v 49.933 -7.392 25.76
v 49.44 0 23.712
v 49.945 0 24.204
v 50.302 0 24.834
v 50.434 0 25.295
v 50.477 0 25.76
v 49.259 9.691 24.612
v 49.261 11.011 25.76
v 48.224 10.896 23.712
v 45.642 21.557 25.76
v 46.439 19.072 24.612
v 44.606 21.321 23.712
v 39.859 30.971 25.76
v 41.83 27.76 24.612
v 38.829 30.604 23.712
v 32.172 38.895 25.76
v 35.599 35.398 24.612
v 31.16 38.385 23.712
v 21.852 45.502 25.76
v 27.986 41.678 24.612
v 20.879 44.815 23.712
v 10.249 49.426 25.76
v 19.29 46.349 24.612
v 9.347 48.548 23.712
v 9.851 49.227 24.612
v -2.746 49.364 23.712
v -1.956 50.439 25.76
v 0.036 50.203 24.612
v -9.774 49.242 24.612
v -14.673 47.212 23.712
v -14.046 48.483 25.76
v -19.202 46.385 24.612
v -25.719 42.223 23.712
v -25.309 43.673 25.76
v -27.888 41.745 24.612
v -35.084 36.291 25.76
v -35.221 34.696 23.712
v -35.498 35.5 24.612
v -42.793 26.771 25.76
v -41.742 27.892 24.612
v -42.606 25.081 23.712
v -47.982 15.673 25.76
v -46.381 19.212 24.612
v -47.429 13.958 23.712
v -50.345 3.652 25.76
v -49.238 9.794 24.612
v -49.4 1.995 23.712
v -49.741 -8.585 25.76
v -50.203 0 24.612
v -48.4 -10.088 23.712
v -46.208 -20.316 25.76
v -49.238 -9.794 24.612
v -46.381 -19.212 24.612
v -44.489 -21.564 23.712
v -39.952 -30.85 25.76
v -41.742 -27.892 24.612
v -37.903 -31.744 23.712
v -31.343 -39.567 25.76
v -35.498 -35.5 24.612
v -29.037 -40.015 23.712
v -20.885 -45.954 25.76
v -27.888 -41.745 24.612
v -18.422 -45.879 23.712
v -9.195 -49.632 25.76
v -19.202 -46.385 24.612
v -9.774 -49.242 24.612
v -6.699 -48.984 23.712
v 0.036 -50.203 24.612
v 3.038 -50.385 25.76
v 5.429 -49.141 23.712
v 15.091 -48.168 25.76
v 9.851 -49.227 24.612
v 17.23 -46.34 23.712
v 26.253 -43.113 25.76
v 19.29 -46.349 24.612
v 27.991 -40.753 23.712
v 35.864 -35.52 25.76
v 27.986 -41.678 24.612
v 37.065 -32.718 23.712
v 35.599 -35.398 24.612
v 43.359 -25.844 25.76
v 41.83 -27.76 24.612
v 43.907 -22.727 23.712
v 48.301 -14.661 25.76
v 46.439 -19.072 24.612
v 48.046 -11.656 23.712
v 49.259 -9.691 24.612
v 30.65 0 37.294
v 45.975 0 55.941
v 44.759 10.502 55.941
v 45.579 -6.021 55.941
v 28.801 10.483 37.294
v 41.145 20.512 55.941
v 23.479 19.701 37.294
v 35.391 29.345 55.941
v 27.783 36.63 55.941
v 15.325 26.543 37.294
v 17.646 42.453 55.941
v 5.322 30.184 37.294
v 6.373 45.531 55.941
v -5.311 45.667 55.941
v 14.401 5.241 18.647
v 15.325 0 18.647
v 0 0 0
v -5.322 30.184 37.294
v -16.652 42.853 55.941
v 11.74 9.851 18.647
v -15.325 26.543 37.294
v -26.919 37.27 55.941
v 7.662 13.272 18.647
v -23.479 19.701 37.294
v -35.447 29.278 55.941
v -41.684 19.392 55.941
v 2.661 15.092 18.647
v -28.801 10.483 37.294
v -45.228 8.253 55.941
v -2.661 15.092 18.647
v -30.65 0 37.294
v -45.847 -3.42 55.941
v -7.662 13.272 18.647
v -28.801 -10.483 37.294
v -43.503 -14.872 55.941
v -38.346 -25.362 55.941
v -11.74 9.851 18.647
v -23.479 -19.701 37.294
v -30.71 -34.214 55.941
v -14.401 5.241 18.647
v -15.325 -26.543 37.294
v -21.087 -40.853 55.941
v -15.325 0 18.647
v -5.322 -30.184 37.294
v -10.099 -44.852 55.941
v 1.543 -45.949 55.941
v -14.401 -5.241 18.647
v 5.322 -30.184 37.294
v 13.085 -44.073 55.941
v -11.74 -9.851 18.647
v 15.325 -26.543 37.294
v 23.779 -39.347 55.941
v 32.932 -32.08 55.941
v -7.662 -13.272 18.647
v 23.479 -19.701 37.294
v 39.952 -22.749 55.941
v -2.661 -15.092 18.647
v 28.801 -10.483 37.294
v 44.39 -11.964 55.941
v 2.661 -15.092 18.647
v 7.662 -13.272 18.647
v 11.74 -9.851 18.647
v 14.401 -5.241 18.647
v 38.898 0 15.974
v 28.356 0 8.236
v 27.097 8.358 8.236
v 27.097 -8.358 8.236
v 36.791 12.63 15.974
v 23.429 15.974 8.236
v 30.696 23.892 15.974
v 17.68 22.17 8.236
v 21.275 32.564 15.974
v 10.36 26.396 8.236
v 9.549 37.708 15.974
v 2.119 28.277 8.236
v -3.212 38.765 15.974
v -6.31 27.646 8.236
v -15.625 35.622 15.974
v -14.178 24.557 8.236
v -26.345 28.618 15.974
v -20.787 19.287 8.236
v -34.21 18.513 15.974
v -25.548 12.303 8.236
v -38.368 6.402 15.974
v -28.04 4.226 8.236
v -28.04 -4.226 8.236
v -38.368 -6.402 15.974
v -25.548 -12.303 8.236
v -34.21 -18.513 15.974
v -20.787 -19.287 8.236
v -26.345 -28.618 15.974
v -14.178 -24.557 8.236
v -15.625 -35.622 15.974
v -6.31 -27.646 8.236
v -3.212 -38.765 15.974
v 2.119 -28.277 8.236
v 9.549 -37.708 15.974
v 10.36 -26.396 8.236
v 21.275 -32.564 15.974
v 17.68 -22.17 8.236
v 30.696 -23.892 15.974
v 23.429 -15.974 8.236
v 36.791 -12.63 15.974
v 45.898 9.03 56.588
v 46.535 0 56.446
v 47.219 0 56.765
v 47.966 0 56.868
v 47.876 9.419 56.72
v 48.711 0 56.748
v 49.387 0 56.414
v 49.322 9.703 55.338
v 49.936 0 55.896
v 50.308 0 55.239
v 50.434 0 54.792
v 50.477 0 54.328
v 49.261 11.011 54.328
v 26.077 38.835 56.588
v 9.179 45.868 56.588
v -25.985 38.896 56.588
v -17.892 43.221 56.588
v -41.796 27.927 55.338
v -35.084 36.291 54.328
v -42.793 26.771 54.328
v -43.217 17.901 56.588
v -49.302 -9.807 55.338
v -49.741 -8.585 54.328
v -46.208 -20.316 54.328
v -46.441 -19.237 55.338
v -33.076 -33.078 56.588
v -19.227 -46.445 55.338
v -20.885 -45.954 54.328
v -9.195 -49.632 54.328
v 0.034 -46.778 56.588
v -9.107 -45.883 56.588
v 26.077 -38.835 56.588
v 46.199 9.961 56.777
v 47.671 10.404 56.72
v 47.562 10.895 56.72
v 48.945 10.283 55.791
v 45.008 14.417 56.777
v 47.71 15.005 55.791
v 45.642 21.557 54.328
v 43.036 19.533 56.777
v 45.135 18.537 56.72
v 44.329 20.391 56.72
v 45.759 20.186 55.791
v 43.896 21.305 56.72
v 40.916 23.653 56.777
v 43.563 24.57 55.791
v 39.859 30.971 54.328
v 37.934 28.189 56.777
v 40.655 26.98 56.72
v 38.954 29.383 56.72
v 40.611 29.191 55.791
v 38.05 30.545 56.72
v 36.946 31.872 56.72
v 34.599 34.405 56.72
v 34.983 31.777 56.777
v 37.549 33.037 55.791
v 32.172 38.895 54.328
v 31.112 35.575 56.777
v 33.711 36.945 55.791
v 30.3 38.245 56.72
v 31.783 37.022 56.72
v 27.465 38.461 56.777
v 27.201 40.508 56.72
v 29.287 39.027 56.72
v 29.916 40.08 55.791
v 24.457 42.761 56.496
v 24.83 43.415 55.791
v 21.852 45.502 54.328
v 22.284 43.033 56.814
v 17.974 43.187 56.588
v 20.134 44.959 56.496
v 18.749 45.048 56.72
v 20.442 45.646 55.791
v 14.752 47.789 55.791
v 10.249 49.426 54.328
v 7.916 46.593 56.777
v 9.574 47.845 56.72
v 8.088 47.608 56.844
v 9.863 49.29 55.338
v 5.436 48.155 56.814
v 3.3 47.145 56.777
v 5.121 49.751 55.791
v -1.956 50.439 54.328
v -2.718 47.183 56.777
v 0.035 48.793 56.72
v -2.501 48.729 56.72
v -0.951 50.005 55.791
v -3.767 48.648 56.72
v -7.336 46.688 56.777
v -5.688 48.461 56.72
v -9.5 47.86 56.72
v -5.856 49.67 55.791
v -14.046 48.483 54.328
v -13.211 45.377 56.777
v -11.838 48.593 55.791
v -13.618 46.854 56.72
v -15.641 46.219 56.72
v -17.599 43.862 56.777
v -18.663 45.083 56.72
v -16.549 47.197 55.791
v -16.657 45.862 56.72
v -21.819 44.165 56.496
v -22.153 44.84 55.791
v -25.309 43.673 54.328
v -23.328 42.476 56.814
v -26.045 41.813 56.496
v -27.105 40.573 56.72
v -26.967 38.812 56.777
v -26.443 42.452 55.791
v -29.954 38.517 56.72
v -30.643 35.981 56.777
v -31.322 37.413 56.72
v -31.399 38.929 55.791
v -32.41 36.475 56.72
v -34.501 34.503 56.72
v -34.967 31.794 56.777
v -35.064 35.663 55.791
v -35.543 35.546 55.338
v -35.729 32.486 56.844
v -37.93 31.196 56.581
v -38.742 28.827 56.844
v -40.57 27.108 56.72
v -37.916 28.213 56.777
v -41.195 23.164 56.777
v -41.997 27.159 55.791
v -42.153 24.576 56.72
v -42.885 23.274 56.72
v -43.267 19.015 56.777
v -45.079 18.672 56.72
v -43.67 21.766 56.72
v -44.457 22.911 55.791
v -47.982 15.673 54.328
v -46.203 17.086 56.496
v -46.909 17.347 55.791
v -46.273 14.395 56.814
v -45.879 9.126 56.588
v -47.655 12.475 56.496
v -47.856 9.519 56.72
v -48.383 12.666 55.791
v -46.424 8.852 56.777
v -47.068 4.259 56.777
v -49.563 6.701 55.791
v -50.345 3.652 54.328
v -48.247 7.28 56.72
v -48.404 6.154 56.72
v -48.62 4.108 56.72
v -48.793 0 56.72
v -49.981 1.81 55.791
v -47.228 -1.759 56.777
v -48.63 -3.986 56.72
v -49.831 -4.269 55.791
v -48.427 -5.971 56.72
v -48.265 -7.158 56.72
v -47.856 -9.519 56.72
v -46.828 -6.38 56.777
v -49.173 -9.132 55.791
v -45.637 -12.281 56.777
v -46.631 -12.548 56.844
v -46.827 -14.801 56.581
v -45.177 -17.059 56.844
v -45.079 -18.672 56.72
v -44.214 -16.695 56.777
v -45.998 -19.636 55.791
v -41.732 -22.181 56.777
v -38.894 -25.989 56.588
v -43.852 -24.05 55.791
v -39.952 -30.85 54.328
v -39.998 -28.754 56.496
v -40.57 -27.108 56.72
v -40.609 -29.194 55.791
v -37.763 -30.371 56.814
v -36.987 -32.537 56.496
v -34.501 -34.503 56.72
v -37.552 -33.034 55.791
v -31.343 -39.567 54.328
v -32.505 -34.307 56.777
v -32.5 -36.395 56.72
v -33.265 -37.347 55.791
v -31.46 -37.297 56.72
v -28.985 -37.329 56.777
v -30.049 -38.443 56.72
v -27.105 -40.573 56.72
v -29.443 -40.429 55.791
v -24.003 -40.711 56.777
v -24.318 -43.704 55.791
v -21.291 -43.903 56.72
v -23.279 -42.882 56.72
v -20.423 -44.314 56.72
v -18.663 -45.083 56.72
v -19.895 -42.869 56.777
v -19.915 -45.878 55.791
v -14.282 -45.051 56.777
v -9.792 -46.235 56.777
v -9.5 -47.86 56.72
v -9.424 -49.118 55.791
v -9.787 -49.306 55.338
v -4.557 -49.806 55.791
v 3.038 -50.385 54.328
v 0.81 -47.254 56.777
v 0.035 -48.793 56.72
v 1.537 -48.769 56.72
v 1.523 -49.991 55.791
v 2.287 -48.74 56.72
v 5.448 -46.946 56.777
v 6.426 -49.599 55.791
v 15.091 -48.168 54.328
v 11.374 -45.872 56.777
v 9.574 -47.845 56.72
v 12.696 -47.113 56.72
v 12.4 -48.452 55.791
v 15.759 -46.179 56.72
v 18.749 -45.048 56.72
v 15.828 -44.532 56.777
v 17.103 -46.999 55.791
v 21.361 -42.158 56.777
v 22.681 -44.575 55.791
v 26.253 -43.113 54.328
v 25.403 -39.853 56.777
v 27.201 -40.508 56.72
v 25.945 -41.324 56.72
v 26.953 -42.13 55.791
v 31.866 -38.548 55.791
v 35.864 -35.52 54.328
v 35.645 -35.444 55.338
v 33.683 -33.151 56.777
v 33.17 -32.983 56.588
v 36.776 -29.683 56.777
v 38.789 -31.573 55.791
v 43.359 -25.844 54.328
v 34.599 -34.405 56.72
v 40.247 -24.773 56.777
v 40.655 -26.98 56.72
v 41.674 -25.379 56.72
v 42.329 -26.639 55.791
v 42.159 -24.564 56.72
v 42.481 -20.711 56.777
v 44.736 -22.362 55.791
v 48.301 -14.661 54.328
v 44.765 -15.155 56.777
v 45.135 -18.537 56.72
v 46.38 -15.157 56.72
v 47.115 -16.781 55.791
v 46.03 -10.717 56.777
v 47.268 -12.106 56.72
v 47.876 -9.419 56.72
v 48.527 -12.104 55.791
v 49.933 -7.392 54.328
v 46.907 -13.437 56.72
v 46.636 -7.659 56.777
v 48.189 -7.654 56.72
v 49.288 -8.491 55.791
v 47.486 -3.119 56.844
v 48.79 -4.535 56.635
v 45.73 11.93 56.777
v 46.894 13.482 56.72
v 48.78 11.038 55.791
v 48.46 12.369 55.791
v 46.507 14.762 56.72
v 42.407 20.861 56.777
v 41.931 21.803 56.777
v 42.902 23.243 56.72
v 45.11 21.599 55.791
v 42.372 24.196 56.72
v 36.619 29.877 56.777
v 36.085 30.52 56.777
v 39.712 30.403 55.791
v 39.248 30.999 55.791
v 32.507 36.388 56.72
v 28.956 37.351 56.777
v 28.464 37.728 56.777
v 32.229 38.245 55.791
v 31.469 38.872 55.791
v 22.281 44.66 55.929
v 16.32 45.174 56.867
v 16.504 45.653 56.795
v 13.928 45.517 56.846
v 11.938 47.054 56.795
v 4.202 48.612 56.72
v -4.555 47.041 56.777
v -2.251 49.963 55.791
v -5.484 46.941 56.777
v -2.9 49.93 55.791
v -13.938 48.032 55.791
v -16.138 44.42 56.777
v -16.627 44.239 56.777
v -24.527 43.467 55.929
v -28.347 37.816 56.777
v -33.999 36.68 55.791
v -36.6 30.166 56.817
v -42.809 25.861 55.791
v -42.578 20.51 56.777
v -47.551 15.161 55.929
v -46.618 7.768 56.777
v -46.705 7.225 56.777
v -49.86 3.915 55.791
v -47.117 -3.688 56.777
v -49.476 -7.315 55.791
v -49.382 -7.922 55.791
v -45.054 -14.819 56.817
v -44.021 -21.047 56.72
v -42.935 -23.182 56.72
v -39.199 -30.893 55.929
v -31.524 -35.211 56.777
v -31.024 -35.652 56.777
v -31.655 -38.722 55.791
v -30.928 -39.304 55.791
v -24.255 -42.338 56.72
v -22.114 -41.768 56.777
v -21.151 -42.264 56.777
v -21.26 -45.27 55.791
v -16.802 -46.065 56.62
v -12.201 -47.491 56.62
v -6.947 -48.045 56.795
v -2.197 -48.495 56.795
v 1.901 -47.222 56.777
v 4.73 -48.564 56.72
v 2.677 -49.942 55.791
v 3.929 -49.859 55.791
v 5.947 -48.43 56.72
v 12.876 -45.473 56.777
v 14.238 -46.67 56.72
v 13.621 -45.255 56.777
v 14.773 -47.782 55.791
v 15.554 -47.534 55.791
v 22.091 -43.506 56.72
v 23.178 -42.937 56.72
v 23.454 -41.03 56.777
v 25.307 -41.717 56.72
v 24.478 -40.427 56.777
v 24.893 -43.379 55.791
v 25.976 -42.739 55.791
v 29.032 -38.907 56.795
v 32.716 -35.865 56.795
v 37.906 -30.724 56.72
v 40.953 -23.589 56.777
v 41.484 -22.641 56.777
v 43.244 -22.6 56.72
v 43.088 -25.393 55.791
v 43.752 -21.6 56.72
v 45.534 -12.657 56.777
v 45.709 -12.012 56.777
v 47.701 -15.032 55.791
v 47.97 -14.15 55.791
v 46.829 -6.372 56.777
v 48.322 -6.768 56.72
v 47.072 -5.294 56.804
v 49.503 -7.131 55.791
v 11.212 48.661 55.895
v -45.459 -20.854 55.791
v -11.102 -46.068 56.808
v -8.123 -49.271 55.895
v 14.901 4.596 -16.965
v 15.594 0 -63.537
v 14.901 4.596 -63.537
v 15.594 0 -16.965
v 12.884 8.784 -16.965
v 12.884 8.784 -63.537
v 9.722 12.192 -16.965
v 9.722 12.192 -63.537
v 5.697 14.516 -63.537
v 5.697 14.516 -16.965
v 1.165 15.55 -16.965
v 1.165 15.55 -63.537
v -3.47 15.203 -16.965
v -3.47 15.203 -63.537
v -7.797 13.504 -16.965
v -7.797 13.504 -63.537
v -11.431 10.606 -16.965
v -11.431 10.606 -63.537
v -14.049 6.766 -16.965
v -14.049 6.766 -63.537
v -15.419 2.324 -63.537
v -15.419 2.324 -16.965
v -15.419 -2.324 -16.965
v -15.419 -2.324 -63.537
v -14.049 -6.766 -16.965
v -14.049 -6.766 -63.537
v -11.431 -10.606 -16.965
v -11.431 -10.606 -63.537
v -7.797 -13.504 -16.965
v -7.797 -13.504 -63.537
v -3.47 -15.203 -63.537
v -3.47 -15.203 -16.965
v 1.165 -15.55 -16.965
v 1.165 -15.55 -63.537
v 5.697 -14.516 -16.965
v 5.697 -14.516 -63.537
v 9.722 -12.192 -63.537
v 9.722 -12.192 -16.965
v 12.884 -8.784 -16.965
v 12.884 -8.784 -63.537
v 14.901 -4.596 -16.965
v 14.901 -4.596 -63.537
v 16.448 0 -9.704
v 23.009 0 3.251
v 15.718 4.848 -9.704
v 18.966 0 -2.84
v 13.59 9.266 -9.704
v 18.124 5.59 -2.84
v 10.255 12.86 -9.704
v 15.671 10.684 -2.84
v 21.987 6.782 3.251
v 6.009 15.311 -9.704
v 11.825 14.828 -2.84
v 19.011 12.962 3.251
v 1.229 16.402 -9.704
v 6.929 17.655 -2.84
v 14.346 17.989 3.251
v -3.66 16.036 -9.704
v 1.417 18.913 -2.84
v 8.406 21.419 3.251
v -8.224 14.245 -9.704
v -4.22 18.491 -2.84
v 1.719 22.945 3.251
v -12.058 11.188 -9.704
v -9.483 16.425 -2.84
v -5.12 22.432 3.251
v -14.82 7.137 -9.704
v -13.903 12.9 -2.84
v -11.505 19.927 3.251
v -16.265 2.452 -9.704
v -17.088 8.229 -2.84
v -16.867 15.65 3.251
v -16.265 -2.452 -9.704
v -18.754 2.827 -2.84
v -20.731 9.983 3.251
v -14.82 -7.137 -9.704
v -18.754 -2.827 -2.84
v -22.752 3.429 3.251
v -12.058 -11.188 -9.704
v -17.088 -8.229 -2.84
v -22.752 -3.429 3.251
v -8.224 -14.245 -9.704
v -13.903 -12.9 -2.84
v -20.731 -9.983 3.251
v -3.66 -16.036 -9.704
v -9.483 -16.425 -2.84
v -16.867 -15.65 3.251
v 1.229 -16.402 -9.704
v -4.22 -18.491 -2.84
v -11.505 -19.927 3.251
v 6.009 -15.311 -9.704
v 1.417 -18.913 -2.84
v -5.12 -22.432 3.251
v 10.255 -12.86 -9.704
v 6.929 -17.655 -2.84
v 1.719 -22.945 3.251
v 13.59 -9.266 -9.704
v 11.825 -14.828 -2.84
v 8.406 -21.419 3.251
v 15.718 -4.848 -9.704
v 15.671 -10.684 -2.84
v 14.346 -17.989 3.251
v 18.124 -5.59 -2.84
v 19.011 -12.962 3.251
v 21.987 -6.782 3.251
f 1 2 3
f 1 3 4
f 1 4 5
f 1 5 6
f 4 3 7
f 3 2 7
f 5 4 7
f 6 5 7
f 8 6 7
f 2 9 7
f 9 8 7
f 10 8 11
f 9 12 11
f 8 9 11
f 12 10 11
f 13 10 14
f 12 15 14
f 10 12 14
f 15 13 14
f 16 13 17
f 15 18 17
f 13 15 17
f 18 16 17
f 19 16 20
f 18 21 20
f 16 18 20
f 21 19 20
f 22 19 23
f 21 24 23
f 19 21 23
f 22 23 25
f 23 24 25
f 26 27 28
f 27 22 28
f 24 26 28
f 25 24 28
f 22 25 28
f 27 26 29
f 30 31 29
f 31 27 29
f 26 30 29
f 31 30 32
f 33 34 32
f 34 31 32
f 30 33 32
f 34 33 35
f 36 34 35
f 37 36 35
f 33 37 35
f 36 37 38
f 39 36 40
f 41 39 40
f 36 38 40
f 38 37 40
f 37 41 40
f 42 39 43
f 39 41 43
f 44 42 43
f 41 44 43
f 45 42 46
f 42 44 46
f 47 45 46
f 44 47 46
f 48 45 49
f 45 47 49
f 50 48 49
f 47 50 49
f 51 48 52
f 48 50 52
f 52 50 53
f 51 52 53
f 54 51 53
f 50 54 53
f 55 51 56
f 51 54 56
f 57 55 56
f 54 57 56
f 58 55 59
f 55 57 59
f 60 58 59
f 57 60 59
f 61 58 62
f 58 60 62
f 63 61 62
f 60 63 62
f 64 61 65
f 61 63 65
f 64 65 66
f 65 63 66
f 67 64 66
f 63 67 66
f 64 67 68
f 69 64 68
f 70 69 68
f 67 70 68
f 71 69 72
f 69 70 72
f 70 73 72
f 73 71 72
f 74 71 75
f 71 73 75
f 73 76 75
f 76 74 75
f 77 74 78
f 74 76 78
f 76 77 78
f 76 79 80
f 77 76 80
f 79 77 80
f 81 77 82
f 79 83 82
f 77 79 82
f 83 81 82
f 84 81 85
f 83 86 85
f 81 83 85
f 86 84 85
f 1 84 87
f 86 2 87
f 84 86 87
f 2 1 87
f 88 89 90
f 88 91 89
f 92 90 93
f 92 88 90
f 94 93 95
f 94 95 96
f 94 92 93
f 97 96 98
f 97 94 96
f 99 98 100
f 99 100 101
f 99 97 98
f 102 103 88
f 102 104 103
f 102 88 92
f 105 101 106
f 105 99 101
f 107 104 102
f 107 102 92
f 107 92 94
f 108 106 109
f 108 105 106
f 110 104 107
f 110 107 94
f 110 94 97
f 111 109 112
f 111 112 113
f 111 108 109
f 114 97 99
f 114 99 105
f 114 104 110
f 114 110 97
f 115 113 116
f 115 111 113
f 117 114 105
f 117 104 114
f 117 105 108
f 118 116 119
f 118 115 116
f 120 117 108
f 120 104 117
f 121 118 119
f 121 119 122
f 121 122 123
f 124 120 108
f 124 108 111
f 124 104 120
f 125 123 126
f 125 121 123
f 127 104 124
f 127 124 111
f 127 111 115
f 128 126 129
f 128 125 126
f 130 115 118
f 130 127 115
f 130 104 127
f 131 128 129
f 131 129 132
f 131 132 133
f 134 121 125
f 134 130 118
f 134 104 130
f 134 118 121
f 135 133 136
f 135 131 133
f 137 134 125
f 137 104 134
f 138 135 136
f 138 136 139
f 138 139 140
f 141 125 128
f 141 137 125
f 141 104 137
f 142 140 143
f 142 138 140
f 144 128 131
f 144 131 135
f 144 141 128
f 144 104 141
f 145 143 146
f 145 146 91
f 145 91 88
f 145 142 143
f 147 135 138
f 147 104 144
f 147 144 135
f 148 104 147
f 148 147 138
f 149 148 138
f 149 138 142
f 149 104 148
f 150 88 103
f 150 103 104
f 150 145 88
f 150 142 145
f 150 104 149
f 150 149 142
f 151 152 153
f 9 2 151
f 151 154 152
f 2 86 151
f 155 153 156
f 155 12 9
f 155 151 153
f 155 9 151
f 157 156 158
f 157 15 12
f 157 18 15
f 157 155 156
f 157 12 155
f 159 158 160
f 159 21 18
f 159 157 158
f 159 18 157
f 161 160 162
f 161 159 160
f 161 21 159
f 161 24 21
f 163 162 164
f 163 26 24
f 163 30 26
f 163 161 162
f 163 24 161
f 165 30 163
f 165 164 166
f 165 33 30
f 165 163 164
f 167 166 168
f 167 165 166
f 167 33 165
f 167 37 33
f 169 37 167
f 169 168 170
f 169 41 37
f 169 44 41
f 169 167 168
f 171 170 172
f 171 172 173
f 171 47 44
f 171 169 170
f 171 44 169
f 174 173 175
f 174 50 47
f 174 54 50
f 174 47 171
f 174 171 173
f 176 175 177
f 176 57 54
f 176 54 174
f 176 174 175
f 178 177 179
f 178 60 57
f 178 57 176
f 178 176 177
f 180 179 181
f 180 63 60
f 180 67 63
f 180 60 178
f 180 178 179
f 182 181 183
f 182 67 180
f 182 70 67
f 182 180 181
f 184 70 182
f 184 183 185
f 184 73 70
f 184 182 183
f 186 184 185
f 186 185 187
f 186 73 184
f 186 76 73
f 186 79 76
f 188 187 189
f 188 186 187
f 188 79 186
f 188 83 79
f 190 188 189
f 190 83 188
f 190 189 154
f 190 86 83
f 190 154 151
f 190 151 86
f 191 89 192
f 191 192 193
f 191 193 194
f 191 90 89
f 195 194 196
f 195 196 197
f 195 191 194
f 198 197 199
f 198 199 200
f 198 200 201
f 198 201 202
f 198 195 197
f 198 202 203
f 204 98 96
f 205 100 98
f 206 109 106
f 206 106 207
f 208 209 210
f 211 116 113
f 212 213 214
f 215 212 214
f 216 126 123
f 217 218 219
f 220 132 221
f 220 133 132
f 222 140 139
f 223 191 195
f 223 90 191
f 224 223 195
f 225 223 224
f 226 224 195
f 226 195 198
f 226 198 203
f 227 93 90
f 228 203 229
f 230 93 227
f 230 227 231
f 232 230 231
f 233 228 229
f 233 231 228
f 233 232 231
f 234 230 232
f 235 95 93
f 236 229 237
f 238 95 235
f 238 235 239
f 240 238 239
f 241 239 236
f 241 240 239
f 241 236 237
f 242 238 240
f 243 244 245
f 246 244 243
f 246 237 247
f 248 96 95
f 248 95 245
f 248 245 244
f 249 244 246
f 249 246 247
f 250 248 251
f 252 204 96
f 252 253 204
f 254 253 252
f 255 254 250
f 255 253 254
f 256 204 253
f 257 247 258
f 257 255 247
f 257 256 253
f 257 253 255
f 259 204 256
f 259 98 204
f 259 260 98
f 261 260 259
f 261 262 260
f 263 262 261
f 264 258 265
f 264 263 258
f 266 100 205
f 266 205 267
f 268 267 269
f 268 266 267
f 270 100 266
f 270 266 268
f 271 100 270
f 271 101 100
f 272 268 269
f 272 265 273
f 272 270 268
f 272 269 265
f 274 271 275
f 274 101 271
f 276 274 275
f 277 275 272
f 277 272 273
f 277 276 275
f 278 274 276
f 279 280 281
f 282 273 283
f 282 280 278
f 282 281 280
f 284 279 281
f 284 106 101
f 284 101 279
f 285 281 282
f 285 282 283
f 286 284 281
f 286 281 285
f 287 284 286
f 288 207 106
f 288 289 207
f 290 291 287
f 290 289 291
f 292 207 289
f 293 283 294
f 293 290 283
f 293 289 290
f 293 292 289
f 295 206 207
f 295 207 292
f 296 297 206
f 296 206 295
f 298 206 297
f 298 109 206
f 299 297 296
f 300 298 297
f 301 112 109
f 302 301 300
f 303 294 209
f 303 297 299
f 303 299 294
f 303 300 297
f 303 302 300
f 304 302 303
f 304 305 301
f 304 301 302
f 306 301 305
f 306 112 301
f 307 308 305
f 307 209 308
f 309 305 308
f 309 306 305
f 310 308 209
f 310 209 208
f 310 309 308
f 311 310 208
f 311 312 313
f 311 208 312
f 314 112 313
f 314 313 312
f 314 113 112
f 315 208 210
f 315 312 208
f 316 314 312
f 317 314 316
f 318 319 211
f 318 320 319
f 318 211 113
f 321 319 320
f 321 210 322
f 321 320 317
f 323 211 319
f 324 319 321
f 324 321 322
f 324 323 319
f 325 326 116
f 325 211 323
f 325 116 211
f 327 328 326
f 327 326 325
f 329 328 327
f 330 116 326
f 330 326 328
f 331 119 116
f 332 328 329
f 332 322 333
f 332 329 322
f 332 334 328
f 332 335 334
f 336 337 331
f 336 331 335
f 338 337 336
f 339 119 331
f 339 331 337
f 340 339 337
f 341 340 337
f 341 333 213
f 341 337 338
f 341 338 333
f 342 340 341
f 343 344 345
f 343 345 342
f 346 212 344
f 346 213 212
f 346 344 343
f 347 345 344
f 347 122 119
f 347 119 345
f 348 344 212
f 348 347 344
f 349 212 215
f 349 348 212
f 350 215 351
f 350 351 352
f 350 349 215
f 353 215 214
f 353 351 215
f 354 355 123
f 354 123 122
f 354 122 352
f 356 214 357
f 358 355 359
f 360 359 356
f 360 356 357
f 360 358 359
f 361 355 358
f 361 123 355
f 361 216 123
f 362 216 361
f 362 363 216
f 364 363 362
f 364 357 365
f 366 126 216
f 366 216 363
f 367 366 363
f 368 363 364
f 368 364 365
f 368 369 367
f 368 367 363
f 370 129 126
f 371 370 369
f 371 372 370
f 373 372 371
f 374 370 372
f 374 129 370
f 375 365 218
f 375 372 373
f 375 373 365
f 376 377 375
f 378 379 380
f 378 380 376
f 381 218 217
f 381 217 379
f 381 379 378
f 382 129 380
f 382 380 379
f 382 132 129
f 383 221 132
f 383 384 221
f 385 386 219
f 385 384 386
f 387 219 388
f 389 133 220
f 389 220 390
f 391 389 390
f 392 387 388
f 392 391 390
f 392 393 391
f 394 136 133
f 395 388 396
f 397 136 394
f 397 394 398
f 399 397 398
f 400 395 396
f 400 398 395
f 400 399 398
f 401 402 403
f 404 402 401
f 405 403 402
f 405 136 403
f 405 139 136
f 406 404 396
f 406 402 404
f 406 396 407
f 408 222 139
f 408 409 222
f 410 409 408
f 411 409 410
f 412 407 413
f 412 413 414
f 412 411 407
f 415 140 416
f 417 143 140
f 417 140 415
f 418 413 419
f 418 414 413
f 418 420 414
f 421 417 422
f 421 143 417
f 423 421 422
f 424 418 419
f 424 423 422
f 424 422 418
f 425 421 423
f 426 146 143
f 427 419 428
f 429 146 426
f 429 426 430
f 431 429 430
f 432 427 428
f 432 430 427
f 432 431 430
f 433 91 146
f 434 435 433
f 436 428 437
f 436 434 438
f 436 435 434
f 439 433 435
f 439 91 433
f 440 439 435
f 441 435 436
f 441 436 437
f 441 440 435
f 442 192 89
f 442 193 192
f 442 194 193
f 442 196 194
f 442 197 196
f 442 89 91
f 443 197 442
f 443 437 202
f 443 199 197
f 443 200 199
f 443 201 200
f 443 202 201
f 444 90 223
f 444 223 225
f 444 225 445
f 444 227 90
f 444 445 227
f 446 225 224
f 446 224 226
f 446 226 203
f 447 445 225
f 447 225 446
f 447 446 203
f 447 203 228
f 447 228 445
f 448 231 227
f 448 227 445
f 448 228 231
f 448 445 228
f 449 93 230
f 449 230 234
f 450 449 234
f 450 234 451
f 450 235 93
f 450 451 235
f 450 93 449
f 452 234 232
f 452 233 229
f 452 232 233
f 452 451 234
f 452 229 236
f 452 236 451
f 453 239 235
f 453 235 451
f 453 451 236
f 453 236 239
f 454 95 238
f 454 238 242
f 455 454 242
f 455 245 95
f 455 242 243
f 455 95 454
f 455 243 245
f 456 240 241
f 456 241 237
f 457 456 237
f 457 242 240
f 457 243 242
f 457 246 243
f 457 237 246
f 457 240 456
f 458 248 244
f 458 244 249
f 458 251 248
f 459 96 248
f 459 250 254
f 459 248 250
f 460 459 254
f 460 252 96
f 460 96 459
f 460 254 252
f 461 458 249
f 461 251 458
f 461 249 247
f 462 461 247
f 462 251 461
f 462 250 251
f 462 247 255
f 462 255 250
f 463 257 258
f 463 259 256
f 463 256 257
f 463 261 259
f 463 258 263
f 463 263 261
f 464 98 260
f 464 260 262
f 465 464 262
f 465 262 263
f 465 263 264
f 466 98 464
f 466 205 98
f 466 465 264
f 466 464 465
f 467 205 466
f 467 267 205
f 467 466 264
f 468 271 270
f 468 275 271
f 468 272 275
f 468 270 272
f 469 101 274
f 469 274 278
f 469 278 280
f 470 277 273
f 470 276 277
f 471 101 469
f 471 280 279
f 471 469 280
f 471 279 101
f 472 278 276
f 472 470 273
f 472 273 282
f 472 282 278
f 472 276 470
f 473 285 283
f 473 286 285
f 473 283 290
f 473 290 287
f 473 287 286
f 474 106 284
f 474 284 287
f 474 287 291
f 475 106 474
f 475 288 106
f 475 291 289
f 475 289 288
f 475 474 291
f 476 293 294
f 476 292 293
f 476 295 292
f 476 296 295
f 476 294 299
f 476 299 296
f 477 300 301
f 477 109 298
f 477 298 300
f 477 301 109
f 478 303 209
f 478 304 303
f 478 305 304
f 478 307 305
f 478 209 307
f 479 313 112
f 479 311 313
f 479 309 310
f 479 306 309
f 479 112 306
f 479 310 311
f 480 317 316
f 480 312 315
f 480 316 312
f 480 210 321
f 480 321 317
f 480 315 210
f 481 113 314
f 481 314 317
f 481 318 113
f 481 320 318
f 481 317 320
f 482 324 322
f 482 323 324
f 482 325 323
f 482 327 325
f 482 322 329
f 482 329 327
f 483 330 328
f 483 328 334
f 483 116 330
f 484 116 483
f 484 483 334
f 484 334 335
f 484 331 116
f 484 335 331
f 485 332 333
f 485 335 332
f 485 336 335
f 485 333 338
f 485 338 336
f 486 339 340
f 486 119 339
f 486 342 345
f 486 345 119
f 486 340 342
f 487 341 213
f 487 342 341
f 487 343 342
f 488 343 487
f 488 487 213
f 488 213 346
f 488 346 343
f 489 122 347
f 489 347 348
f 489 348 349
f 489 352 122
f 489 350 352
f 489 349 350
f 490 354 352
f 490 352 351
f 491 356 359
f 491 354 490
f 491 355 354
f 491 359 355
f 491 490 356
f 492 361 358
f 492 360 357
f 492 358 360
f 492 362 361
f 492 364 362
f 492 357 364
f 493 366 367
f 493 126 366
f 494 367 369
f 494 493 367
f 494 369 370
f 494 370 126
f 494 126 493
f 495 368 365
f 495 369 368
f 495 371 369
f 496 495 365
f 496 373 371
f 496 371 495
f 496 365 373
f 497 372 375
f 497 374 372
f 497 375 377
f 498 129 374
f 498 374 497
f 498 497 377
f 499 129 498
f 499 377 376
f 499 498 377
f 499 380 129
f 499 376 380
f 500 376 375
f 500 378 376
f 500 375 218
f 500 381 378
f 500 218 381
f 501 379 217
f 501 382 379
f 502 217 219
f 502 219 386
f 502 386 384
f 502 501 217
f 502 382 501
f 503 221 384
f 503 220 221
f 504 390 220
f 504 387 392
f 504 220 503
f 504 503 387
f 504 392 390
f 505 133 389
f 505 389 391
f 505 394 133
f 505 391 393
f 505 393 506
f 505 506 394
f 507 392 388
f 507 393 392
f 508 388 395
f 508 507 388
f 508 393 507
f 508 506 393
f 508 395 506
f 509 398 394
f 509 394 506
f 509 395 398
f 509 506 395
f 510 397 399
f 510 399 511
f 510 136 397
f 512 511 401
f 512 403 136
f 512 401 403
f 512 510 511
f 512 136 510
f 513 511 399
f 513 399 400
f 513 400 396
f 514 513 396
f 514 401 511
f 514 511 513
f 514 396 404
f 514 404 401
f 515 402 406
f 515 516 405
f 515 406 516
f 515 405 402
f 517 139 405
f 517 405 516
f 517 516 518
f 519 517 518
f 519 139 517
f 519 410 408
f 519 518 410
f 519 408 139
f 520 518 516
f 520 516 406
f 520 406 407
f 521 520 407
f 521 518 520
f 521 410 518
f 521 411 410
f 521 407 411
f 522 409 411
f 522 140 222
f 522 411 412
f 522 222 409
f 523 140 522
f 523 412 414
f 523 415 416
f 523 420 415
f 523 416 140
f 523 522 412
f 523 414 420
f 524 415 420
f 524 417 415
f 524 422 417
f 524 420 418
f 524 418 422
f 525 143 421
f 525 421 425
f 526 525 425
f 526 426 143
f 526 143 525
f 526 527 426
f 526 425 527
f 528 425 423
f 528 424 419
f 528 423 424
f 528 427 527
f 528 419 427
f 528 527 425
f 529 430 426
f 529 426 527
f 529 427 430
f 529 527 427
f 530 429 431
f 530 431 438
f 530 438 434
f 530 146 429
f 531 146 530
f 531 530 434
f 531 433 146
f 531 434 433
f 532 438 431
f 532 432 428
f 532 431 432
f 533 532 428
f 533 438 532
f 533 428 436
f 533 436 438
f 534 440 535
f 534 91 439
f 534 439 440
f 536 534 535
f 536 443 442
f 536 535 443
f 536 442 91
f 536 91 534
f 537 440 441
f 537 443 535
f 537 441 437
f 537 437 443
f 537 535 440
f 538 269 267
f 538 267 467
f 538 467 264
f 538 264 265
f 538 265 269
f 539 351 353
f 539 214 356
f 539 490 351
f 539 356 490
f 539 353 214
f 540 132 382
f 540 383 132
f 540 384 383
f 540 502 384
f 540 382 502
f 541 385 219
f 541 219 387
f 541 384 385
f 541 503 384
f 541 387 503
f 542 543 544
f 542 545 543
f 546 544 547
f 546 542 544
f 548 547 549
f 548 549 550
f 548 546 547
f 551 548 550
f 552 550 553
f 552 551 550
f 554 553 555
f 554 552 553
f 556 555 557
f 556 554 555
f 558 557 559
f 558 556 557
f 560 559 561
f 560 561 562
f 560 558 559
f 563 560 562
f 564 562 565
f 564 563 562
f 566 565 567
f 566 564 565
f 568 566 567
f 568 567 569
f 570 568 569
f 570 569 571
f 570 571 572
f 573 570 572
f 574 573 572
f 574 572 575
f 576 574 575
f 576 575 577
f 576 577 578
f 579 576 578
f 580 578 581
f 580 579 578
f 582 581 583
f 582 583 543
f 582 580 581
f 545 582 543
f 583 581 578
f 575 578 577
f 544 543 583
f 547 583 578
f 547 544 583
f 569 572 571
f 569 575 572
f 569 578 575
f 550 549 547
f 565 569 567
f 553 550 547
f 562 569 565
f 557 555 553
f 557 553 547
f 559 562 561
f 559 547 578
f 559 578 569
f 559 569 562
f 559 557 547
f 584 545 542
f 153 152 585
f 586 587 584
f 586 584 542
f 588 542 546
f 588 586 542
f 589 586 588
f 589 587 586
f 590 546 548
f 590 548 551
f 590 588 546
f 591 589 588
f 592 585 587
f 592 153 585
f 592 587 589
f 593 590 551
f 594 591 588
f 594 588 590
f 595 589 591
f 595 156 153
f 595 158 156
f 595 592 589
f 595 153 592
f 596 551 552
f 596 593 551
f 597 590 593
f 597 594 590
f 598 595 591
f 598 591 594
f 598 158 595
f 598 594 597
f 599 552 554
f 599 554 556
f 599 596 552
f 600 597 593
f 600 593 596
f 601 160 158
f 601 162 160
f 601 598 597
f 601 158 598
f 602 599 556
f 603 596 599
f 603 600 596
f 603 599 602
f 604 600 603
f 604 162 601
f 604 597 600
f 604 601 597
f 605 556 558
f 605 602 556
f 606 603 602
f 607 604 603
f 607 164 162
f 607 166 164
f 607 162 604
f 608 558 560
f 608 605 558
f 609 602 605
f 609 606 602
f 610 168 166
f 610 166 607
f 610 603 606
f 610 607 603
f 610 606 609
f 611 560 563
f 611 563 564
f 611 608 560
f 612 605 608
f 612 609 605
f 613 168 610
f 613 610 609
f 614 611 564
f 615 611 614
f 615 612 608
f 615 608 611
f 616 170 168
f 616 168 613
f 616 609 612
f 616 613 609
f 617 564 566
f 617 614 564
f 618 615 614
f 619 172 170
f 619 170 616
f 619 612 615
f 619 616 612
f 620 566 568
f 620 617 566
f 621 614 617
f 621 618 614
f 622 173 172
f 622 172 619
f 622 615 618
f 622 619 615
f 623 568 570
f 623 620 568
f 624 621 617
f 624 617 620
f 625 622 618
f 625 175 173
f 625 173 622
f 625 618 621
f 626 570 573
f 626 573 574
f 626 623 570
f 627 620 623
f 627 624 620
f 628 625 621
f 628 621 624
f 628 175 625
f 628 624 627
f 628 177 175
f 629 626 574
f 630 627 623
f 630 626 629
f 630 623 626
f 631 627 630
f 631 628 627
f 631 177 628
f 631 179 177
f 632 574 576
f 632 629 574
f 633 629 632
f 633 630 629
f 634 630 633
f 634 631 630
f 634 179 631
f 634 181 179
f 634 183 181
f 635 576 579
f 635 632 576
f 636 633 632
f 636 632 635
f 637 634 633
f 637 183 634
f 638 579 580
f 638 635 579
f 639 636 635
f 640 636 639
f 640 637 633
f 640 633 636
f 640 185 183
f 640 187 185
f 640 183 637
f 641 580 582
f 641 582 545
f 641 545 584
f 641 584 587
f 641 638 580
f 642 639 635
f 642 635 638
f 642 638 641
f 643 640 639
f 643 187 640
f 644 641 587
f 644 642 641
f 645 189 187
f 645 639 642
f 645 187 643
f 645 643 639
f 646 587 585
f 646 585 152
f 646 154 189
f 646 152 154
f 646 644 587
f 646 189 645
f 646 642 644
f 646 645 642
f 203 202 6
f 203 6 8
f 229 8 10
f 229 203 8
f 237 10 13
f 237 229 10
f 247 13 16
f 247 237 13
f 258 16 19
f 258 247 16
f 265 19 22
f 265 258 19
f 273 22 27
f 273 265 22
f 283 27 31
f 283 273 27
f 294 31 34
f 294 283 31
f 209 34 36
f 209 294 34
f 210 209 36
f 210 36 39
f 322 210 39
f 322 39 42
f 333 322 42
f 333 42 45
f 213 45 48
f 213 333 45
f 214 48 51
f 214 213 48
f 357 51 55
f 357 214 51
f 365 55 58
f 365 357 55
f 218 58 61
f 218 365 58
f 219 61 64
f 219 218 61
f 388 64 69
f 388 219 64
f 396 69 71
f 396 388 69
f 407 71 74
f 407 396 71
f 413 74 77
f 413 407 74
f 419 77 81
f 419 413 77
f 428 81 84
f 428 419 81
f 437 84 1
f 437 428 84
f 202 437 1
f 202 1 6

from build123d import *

# Parameters (mm, degrees)
F2_R = 2.54


with BuildPart() as f1:
    # F0 (on Front) → F1 (revolve)
    with BuildSketch(Plane.XZ):
        with BuildLine():
            Line((50.4768975079, 61.4194460213), (0, 0))
            Line((0, 0), (0, -63.5373517871))
            Line((0, -63.5373517871), (15.5935517171, -63.5373517871))
            Line((15.5935517171, -63.5373517871), (15.5935517171, -16.9645253417))
            ThreePointArc((15.5935517171, -16.9645253417), (18.9662168832, -2.8402970726), (28.3564869314, 8.2363234833))
            Line((28.3564869314, 8.2363234833), (50.4768975079, 24.4736485183))
            Line((50.4768975079, 24.4736485183), (50.4768975079, 61.4194460213))
        make_face()
    revolve(axis=Axis((0, 0, 22.0490116626), (0, 0, 1)))

    # F2
    f2_edges = [f1.edges().sort_by_distance(p)[0] for p in [
        (-50.476898, 0, 61.419446),
        (-50.476898, 0, 24.473649),
    ]]
    fillet(f2_edges, radius=F2_R)


solid = f1.part
